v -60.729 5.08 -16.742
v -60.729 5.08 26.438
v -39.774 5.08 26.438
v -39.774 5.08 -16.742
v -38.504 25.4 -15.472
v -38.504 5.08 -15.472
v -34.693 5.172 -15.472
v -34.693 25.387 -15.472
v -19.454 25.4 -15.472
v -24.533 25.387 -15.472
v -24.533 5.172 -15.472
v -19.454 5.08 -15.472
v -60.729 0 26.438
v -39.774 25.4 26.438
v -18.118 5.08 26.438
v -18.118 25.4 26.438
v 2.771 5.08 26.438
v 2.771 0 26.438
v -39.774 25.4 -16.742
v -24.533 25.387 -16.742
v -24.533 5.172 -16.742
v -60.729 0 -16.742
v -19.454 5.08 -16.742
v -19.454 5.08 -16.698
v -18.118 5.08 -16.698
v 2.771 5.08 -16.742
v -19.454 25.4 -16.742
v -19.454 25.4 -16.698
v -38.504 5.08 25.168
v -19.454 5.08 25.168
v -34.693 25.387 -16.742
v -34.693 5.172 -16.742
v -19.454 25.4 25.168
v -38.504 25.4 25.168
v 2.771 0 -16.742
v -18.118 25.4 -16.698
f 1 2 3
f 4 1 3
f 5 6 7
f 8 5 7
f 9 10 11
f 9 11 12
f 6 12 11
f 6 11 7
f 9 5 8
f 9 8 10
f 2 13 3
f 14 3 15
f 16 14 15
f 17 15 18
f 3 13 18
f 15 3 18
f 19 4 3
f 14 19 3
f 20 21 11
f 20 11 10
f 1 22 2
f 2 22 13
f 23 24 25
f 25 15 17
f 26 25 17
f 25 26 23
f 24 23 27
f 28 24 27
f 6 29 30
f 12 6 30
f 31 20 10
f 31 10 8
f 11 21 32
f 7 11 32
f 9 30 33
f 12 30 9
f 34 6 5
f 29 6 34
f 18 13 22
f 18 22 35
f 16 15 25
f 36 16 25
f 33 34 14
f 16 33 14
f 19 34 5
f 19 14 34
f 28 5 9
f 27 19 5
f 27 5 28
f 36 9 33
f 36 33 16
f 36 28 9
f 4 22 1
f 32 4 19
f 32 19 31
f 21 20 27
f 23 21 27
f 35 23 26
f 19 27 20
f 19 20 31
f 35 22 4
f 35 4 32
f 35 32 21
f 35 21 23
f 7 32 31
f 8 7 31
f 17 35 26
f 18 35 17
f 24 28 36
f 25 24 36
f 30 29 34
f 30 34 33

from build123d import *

# Parameters (mm, degrees)
SKETCH1_W           = 63.5
SKETCH1_H           = 21.59
BOSS_EXTRUDE1_DEPTH = 5.08
SKETCH2_W           = 19.05
SKETCH2_H           = 20.32
BOSS_EXTRUDE2_DEPTH = 1.27
SKETCH3_W           = 1.27
SKETCH3_H           = 21.59
BOSS_EXTRUDE3_DEPTH = 20.32
SKETCH4_W           = 1.336000662
SKETCH4_H           = 43.13668157
BOSS_EXTRUDE4_DEPTH = 20.32
SKETCH5_W           = 10.16
SKETCH5_H           = 20.215193183
CUT_EXTRUDE2_DEPTH  = 1.27


with BuildPart() as part:
    # Sketch1 → Boss-Extrude1 (new body)
    with BuildSketch(Plane(origin=(0, 0, 0), x_dir=(1, 0, 0), z_dir=(0, 1, 0))):
        with Locations((-28.979219315, -15.643333637)):
            Rectangle(SKETCH1_W, SKETCH1_H)
    boss_extrude1 = extrude(amount=BOSS_EXTRUDE1_DEPTH)

    # Sketch2 → Boss-Extrude2 (add)
    with BuildSketch(Plane.XY.offset(26.438333637)):
        with Locations((-28.979219315, 15.24)):
            Rectangle(SKETCH2_W, SKETCH2_H)
    boss_extrude2 = extrude(amount=-BOSS_EXTRUDE2_DEPTH)

    # Sketch3 → Boss-Extrude3 (add)
    with BuildSketch(Plane(origin=(0, 5.08, 0), x_dir=(1, 0, 0), z_dir=(0, 1, 0))):
        with Locations((-39.139219315, -15.643333637)):
            Rectangle(SKETCH3_W, SKETCH3_H)
    boss_extrude3 = extrude(amount=BOSS_EXTRUDE3_DEPTH)

    # Mirror2: Boss-Extrude1, Boss-Extrude2, Boss-Extrude3 across plane
    add(boss_extrude1.mirror(Plane(origin=(-60.729219315, 5.08, 4.848333637), x_dir=(1, 0, 0), z_dir=(0, 0, 1))))
    add(boss_extrude2.mirror(Plane(origin=(-60.729219315, 5.08, 4.848333637), x_dir=(1, 0, 0), z_dir=(0, 0, 1))))
    add(boss_extrude3.mirror(Plane(origin=(-60.729219315, 5.08, 4.848333637), x_dir=(1, 0, 0), z_dir=(0, 0, 1))))

    # Sketch4 → Boss-Extrude4 (add)
    with BuildSketch(Plane(origin=(0, 5.08, 0), x_dir=(1, 0, 0), z_dir=(0, 1, 0))):
        with Locations((-18.786218984, -4.869992852)):
            Rectangle(SKETCH4_W, SKETCH4_H)
    extrude(amount=BOSS_EXTRUDE4_DEPTH)

    # Sketch5 → Cut-Extrude2 (cut)
    with BuildSketch(Plane(origin=(0, 0, -16.741666363), x_dir=(-1, 0, 0), z_dir=(0, 0, -1))):
        with Locations((29.613387645, 15.279515477)):
            Rectangle(SKETCH5_W, SKETCH5_H)
    extrude(amount=-CUT_EXTRUDE2_DEPTH, mode=Mode.SUBTRACT)


solid = part.part
